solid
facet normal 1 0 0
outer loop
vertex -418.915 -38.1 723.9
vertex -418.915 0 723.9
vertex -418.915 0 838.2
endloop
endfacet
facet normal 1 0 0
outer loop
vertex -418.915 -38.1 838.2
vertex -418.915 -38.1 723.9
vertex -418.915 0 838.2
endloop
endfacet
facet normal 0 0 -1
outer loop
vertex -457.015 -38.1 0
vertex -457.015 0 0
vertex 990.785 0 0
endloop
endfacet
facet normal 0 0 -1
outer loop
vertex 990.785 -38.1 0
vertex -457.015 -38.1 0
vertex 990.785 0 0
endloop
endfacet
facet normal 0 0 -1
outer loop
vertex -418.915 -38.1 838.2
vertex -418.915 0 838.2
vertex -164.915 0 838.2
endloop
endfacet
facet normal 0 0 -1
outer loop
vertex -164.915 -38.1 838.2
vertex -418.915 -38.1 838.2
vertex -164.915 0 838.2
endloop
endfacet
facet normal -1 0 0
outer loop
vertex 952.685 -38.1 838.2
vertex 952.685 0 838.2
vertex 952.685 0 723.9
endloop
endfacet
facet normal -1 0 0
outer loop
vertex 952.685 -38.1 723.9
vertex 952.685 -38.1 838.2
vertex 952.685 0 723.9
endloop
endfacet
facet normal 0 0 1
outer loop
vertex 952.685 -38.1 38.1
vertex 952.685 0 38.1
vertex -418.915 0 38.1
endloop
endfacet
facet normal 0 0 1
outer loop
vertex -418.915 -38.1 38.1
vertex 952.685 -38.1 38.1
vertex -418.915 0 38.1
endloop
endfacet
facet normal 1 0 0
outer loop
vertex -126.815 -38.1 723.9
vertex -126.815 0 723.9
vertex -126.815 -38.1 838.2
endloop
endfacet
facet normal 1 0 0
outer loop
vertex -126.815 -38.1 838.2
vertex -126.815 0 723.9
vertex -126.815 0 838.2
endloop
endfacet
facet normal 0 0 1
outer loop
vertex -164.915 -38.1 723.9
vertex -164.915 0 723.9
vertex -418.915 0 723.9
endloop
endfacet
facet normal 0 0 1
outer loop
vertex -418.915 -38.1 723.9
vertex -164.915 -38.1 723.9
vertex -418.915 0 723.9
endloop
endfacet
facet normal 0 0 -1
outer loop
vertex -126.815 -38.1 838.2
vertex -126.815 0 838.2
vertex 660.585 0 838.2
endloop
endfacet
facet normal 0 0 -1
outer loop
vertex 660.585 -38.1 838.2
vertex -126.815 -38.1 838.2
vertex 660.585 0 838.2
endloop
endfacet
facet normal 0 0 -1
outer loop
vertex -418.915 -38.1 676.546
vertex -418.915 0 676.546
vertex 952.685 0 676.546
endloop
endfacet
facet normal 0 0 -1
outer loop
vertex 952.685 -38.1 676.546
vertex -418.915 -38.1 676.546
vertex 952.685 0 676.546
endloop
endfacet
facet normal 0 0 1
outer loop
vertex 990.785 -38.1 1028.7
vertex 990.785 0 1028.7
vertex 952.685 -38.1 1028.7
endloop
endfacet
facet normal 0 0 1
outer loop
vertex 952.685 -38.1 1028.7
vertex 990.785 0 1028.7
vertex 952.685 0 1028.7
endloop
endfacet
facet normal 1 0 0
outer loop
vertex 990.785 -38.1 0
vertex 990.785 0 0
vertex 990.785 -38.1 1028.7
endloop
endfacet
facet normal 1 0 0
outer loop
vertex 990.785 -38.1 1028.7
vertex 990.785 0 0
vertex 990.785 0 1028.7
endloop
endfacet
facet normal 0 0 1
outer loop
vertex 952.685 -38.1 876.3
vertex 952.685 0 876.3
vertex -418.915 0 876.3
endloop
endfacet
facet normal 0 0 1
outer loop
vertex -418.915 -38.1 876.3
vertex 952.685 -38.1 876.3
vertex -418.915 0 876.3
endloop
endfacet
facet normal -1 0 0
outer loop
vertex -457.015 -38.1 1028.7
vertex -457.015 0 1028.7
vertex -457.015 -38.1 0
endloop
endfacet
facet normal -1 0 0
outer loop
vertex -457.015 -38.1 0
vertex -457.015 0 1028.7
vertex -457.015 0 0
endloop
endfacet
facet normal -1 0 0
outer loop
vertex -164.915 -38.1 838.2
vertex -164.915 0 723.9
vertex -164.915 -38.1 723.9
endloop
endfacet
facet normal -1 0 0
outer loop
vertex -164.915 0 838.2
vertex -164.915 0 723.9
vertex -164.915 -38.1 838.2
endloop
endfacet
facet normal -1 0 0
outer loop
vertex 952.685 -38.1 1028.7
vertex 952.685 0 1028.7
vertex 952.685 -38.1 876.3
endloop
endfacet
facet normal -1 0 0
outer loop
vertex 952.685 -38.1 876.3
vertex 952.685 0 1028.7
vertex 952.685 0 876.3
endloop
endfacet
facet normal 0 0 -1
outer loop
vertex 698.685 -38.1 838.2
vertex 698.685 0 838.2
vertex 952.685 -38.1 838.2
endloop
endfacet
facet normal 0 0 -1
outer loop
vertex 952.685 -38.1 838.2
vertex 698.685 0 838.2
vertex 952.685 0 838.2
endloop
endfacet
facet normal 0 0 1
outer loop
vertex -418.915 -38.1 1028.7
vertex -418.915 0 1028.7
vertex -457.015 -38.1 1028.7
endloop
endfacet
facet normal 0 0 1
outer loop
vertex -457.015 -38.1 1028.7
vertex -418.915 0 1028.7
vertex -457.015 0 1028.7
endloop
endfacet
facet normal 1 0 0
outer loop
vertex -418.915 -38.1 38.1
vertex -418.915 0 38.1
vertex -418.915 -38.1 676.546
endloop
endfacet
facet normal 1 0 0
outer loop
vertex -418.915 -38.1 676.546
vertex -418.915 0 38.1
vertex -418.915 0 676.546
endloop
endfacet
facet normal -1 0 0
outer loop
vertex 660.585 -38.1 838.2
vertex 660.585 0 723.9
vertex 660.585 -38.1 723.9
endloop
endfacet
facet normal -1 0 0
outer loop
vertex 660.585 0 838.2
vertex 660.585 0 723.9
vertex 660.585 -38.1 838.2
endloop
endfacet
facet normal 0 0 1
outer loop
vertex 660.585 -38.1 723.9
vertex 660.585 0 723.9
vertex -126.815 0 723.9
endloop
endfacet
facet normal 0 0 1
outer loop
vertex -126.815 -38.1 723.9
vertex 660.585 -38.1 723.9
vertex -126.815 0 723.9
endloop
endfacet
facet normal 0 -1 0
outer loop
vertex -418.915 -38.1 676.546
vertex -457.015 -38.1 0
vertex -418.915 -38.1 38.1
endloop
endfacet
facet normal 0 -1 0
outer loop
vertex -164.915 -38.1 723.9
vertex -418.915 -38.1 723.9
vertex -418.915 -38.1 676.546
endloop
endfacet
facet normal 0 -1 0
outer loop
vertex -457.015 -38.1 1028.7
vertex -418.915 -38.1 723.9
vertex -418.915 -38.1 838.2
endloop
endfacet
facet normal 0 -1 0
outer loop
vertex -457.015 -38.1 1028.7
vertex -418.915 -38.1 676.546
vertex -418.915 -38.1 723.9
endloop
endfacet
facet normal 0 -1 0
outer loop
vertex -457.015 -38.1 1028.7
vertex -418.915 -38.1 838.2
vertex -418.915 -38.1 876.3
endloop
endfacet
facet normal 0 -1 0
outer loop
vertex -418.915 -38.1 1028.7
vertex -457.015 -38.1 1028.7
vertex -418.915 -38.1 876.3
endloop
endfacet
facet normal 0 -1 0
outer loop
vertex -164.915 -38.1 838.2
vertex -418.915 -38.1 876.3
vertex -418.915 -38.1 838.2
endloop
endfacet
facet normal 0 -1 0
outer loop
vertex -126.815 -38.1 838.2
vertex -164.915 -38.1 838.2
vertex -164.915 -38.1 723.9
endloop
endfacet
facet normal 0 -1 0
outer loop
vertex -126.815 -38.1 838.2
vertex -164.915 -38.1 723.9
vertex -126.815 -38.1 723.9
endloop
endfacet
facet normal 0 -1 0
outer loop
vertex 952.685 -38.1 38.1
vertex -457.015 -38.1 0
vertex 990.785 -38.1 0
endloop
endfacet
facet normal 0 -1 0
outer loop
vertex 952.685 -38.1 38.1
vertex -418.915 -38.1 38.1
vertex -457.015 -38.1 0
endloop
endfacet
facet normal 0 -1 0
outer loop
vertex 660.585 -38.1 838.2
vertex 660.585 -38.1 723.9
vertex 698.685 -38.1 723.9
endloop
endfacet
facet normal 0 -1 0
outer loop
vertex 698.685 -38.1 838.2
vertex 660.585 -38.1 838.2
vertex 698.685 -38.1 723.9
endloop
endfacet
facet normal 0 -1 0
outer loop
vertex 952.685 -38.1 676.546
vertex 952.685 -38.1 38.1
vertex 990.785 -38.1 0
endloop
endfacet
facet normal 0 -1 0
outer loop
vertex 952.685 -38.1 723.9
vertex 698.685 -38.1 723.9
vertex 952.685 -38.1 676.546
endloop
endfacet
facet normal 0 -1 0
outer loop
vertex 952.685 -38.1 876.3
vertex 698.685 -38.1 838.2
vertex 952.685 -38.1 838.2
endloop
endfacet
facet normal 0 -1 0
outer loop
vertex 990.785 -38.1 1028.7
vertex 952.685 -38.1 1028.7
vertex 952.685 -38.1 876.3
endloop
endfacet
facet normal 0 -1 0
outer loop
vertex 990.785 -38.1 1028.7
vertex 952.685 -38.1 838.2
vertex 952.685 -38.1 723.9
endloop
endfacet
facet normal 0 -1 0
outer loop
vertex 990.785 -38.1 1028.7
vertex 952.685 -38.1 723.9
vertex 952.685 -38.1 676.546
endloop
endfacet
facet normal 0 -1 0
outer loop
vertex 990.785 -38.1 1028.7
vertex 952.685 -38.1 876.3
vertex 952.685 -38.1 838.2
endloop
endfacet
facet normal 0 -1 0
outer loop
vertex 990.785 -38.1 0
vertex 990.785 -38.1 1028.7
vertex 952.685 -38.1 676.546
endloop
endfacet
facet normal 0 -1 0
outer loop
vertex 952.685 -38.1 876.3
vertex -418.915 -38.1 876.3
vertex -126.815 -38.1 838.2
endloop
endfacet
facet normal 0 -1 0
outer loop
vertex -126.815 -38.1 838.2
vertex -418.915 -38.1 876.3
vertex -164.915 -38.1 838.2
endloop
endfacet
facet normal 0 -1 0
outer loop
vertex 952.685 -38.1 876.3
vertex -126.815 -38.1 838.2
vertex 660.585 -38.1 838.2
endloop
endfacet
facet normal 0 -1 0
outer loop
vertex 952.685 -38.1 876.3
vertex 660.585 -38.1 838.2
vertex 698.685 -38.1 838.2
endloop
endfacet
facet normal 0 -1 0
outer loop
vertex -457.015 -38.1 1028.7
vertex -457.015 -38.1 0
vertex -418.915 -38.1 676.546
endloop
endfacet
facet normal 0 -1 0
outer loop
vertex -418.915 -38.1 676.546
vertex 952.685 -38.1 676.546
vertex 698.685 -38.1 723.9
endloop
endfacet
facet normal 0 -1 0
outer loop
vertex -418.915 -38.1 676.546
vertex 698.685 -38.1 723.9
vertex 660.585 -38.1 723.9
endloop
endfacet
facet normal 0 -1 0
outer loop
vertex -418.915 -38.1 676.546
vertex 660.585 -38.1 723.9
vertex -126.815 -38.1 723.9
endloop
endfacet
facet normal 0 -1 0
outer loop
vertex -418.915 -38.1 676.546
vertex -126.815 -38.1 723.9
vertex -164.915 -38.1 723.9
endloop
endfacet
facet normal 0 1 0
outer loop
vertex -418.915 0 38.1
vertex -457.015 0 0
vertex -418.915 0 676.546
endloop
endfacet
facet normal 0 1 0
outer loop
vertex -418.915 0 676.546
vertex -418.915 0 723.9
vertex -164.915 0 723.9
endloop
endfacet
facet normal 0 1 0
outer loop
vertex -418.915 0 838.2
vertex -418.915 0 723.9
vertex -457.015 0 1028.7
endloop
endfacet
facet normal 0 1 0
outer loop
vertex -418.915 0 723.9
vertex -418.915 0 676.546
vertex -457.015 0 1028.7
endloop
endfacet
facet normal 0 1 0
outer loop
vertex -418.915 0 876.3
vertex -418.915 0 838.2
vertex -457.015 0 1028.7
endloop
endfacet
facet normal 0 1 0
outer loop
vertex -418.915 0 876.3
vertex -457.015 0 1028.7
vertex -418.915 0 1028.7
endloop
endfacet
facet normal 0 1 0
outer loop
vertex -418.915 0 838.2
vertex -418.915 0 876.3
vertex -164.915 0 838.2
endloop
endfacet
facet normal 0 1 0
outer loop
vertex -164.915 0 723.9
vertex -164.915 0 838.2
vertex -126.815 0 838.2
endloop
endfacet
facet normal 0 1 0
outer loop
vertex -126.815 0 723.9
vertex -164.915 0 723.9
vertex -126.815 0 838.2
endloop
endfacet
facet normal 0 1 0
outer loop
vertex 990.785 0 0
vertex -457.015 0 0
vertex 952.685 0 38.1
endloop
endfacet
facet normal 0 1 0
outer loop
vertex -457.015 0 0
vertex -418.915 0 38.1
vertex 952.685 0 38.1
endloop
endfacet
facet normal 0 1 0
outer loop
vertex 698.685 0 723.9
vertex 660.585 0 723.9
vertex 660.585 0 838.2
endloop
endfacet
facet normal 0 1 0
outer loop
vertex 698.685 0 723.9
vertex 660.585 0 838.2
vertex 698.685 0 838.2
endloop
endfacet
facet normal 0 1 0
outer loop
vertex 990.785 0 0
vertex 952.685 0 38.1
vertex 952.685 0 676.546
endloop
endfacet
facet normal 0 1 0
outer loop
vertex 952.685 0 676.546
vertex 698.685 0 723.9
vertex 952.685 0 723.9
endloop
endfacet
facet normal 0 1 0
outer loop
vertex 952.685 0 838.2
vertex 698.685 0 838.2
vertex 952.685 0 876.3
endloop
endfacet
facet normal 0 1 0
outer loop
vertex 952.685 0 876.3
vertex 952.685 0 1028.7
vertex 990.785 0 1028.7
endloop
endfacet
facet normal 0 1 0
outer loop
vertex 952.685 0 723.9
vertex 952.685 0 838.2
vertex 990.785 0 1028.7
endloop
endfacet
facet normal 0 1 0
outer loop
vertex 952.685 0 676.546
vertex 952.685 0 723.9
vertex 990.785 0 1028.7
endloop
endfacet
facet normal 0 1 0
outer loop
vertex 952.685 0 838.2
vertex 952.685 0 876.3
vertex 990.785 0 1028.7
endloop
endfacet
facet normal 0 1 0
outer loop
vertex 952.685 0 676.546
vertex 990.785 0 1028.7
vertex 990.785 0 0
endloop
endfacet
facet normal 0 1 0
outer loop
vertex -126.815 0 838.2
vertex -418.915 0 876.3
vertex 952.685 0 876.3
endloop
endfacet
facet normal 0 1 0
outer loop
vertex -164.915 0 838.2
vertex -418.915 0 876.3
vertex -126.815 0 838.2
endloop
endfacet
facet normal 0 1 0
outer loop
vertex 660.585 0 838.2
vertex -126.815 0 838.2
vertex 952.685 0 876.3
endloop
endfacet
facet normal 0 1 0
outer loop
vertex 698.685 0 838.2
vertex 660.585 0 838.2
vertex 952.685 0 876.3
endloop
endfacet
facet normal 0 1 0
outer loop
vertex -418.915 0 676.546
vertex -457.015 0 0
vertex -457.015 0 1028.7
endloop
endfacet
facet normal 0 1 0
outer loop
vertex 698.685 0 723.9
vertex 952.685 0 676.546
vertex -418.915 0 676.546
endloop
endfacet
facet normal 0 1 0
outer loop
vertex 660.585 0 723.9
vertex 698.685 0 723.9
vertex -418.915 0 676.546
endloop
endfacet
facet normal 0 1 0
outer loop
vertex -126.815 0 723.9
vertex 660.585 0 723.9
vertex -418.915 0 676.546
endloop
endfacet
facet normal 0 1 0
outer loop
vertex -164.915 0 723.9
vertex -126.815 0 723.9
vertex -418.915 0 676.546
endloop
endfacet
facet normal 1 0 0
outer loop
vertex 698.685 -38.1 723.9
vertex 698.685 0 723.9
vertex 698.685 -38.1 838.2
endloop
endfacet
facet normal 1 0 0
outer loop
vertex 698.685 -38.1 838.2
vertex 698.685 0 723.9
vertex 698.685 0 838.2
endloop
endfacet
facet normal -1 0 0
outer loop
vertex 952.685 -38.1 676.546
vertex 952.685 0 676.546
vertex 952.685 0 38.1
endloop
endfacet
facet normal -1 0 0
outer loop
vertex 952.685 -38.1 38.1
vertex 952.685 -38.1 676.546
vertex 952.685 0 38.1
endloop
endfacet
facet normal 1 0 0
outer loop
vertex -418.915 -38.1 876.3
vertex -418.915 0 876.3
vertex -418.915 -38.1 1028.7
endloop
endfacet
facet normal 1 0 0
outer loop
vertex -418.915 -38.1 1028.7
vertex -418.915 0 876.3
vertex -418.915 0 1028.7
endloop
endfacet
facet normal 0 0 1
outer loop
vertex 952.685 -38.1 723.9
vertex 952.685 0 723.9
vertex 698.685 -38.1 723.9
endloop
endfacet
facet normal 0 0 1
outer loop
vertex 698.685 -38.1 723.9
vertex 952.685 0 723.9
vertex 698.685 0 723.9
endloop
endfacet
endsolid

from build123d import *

# Parameters (mm, degrees)
F0_W     = 38.1
F0_H     = 114.3
F1_DEPTH = 38.1


with BuildPart() as f1:
    # F0 (on Front) → F1 (new body)
    with BuildSketch(Plane.XZ):
        Polygon((-457.014564, 38.1), (-457.014564, 0), (990.785436, 0), (990.785436, 38.1), (952.685436, 38.1), (-418.914564, 38.1), align=None)
        Polygon((952.685436, 38.1), (990.785436, 38.1), (990.785436, 723.9), (952.685436, 723.9), (952.685436, 676.546395), align=None)
        Polygon((-418.914564, 876.3), (-418.914564, 838.2), (-164.914564, 838.2), (-126.814564, 838.2), (660.585436, 838.2), (698.685436, 838.2), (952.685436, 838.2), (952.685436, 876.3), align=None)
        Polygon((-457.014564, 1028.7), (-457.014564, 723.9), (-418.914564, 723.9), (-418.914564, 838.2), (-418.914564, 876.3), (-418.914564, 1028.7), align=None)
        Polygon((-457.014564, 723.9), (-457.014564, 38.1), (-418.914564, 38.1), (-418.914564, 676.546395), (-418.914564, 723.9), align=None)
        Polygon((952.685436, 723.9), (990.785436, 723.9), (990.785436, 1028.7), (952.685436, 1028.7), (952.685436, 876.3), (952.685436, 838.2), align=None)
        with Locations((-145.864564, 781.05)):
            Rectangle(F0_W, F0_H)
        Polygon((-418.914564, 723.9), (-418.914564, 676.546395), (952.685436, 676.546395), (952.685436, 723.9), (698.685436, 723.9), (660.585436, 723.9), (-126.814564, 723.9), (-164.914564, 723.9), align=None)
        with Locations((679.635436, 781.05)):
            Rectangle(F0_W, F0_H)
    extrude(amount=F1_DEPTH)


solid = f1.part
